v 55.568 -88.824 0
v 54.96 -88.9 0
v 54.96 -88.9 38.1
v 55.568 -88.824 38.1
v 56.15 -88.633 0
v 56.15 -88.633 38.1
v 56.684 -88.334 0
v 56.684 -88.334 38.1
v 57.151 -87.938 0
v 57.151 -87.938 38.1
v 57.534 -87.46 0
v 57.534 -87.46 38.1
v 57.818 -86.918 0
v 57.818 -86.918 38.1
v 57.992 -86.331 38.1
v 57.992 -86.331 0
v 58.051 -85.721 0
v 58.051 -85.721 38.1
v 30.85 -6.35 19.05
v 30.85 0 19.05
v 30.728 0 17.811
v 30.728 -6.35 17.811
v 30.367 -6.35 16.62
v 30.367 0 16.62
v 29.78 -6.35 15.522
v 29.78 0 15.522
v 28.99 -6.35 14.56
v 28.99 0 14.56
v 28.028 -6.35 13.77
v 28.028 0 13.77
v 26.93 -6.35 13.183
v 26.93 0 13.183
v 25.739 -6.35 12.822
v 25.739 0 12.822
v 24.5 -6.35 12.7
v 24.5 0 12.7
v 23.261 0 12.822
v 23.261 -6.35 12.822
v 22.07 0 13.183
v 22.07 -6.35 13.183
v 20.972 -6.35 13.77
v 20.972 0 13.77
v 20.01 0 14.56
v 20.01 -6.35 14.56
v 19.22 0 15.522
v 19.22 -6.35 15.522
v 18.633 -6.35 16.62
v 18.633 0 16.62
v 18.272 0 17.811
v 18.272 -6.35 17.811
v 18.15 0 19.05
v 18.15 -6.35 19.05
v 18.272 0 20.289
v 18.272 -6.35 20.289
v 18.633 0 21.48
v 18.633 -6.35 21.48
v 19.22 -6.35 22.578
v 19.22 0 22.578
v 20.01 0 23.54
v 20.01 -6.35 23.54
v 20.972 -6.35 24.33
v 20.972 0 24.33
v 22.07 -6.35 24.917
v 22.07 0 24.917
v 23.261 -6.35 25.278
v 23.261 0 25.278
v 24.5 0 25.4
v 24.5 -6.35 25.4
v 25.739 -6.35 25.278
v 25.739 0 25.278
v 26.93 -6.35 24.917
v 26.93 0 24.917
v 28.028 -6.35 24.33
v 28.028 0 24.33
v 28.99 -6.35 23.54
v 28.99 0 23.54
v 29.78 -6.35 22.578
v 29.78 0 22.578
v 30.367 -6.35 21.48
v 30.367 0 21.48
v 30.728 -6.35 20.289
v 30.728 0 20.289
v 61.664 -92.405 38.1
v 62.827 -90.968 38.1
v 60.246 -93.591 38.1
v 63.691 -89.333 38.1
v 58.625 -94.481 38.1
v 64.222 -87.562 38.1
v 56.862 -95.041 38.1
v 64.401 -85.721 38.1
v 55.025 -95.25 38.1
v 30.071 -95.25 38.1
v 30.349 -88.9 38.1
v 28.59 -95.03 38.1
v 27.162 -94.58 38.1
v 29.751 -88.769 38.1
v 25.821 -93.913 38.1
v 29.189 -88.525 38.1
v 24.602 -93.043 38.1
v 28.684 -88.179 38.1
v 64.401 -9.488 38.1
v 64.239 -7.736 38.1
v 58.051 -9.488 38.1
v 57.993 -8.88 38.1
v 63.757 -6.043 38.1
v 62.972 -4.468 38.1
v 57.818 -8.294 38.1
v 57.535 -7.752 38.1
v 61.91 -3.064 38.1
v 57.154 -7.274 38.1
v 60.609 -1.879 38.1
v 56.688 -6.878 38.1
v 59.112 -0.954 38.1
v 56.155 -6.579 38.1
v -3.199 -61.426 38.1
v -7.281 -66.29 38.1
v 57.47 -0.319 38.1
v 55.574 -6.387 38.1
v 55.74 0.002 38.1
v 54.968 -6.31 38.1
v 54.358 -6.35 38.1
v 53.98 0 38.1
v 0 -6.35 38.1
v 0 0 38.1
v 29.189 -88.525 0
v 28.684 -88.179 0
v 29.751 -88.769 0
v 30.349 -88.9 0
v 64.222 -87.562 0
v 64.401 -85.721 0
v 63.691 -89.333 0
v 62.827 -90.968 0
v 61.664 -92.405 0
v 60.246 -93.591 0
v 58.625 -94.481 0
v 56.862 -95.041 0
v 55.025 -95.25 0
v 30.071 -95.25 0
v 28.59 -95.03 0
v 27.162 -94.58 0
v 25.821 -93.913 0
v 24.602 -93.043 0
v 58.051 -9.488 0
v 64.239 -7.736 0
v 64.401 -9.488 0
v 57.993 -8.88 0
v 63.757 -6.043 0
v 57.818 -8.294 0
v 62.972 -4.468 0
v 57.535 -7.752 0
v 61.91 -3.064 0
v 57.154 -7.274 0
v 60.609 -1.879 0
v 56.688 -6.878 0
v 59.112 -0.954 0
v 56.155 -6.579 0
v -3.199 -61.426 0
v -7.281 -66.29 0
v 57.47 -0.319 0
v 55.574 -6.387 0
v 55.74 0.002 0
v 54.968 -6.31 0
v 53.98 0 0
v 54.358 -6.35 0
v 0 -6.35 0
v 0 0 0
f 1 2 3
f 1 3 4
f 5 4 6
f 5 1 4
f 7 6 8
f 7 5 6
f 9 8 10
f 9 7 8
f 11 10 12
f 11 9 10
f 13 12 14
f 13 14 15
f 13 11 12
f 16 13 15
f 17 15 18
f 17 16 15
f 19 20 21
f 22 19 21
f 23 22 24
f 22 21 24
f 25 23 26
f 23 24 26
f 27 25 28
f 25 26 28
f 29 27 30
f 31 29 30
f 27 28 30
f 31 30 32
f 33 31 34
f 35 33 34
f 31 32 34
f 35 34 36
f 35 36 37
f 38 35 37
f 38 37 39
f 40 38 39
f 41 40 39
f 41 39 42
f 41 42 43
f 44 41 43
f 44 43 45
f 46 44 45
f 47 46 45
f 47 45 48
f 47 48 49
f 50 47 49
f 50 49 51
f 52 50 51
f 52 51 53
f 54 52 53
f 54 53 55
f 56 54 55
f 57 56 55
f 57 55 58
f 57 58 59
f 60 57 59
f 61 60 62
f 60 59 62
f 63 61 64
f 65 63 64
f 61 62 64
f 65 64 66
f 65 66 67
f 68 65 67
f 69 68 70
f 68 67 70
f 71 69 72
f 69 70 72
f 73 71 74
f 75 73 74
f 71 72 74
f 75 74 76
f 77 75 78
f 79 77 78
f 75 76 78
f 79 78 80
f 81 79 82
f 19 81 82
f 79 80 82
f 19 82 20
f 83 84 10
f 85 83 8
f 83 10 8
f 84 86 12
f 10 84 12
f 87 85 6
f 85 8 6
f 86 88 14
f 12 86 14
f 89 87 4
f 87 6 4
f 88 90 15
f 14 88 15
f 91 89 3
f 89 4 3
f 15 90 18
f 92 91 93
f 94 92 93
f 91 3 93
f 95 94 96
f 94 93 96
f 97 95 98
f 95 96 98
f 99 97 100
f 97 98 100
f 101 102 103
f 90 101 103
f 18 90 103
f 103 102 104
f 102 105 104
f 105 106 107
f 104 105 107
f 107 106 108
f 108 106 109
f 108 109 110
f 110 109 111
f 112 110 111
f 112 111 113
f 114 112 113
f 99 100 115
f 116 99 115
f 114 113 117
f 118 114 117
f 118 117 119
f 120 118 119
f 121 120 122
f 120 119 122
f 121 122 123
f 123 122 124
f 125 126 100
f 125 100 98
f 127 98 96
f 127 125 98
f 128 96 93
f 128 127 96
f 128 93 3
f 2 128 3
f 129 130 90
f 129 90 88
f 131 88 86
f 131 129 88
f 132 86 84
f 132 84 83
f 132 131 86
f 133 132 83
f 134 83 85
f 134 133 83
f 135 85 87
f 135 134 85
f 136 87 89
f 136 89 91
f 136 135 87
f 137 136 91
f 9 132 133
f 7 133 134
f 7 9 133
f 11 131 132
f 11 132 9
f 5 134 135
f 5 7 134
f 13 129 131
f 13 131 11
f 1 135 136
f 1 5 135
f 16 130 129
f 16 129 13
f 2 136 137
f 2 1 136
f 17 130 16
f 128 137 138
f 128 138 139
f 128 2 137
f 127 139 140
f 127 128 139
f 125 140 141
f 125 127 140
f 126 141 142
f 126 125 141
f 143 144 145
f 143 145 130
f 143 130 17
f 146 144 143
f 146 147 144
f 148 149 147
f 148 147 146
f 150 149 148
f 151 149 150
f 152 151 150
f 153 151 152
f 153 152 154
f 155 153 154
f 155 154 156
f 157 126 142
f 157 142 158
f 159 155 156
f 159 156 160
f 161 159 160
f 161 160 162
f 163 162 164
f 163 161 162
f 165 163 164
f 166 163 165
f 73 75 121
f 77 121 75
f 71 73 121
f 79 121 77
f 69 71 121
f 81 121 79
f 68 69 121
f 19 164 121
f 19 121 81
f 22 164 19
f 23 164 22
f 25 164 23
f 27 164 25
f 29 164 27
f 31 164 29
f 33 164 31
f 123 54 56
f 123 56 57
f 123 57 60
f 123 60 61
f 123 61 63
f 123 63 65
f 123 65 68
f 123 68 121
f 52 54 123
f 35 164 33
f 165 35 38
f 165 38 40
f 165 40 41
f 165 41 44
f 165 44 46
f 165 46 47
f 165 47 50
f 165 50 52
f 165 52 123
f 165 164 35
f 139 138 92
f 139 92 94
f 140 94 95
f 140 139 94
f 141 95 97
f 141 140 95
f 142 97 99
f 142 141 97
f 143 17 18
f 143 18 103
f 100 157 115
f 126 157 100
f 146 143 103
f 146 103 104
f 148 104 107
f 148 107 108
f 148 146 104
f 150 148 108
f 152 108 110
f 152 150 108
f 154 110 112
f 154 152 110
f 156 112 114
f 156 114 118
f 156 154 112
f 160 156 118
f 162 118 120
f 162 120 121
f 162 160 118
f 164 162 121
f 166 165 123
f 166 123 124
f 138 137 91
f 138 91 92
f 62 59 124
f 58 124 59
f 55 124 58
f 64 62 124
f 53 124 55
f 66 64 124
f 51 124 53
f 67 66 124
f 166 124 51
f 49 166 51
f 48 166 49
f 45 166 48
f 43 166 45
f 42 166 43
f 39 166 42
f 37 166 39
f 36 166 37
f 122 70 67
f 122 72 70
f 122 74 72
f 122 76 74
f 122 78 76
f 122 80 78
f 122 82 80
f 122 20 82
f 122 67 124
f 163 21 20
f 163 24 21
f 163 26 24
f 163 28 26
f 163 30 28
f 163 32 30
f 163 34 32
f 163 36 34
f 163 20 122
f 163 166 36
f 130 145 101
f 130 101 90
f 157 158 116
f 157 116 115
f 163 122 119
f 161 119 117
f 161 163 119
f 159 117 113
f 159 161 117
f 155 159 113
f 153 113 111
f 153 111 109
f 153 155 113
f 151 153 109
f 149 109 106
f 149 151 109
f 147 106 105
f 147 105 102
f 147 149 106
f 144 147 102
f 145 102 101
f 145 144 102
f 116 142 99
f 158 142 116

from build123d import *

# Parameters (mm, degrees)
BOSS_EXTRUDE1_DEPTH = 38.1
SKETCH2_R           = 6.35
CUT_EXTRUDE1_DEPTH  = 38.1


with BuildPart() as part:
    # Sketch1 → Boss-Extrude1 (new body)
    with BuildSketch(Plane.XY):
        with BuildLine():
            Line((0, 0), (53.98, 0))
            ThreePointArc((53.98, 0), (61.287211447, -2.441393787), (64.401363743, -9.488222735))
            Line((64.401363743, -9.488222735), (64.401363743, -85.721240556))
            ThreePointArc((64.401363743, -85.721240556), (61.664237719, -92.40538322), (55.025128035, -95.25))
            Line((55.025128035, -95.25), (30.071323434, -95.25))
            ThreePointArc((30.071323434, -95.25), (27.161692752, -94.580250085), (24.602099349, -93.043045718))
            Line((24.602099349, -93.043045718), (-7.280670374, -66.290225402))
            Line((-7.280670374, -66.290225402), (-3.198969052, -61.425843189))
            Line((-3.198969052, -61.425843189), (28.68380067, -88.178663504))
            ThreePointArc((28.68380067, -88.178663504), (29.463882201, -88.660646082), (30.349062467, -88.9))
            Line((30.349062467, -88.9), (54.96018039, -88.9))
            ThreePointArc((54.96018039, -88.9), (57.151148485, -87.938216318), (58.051363743, -85.721240556))
            Line((58.051363743, -85.721240556), (58.051363743, -9.488222735))
            ThreePointArc((58.051363743, -9.488222735), (56.930321756, -7.064776449), (54.357595252, -6.35))
            Line((54.357595252, -6.35), (0, -6.35))
            Line((0, -6.35), (0, 0))
        make_face()
    extrude(amount=BOSS_EXTRUDE1_DEPTH)

    # Sketch2 → Cut-Extrude1 (cut)
    with BuildSketch(Plane(origin=(0, 0, 0), x_dir=(1, 0, 0), z_dir=(0, 1, 0))):
        with Locations((24.5, -19.05)):
            Circle(SKETCH2_R)
    extrude(amount=-CUT_EXTRUDE1_DEPTH, mode=Mode.SUBTRACT)


solid = part.part
